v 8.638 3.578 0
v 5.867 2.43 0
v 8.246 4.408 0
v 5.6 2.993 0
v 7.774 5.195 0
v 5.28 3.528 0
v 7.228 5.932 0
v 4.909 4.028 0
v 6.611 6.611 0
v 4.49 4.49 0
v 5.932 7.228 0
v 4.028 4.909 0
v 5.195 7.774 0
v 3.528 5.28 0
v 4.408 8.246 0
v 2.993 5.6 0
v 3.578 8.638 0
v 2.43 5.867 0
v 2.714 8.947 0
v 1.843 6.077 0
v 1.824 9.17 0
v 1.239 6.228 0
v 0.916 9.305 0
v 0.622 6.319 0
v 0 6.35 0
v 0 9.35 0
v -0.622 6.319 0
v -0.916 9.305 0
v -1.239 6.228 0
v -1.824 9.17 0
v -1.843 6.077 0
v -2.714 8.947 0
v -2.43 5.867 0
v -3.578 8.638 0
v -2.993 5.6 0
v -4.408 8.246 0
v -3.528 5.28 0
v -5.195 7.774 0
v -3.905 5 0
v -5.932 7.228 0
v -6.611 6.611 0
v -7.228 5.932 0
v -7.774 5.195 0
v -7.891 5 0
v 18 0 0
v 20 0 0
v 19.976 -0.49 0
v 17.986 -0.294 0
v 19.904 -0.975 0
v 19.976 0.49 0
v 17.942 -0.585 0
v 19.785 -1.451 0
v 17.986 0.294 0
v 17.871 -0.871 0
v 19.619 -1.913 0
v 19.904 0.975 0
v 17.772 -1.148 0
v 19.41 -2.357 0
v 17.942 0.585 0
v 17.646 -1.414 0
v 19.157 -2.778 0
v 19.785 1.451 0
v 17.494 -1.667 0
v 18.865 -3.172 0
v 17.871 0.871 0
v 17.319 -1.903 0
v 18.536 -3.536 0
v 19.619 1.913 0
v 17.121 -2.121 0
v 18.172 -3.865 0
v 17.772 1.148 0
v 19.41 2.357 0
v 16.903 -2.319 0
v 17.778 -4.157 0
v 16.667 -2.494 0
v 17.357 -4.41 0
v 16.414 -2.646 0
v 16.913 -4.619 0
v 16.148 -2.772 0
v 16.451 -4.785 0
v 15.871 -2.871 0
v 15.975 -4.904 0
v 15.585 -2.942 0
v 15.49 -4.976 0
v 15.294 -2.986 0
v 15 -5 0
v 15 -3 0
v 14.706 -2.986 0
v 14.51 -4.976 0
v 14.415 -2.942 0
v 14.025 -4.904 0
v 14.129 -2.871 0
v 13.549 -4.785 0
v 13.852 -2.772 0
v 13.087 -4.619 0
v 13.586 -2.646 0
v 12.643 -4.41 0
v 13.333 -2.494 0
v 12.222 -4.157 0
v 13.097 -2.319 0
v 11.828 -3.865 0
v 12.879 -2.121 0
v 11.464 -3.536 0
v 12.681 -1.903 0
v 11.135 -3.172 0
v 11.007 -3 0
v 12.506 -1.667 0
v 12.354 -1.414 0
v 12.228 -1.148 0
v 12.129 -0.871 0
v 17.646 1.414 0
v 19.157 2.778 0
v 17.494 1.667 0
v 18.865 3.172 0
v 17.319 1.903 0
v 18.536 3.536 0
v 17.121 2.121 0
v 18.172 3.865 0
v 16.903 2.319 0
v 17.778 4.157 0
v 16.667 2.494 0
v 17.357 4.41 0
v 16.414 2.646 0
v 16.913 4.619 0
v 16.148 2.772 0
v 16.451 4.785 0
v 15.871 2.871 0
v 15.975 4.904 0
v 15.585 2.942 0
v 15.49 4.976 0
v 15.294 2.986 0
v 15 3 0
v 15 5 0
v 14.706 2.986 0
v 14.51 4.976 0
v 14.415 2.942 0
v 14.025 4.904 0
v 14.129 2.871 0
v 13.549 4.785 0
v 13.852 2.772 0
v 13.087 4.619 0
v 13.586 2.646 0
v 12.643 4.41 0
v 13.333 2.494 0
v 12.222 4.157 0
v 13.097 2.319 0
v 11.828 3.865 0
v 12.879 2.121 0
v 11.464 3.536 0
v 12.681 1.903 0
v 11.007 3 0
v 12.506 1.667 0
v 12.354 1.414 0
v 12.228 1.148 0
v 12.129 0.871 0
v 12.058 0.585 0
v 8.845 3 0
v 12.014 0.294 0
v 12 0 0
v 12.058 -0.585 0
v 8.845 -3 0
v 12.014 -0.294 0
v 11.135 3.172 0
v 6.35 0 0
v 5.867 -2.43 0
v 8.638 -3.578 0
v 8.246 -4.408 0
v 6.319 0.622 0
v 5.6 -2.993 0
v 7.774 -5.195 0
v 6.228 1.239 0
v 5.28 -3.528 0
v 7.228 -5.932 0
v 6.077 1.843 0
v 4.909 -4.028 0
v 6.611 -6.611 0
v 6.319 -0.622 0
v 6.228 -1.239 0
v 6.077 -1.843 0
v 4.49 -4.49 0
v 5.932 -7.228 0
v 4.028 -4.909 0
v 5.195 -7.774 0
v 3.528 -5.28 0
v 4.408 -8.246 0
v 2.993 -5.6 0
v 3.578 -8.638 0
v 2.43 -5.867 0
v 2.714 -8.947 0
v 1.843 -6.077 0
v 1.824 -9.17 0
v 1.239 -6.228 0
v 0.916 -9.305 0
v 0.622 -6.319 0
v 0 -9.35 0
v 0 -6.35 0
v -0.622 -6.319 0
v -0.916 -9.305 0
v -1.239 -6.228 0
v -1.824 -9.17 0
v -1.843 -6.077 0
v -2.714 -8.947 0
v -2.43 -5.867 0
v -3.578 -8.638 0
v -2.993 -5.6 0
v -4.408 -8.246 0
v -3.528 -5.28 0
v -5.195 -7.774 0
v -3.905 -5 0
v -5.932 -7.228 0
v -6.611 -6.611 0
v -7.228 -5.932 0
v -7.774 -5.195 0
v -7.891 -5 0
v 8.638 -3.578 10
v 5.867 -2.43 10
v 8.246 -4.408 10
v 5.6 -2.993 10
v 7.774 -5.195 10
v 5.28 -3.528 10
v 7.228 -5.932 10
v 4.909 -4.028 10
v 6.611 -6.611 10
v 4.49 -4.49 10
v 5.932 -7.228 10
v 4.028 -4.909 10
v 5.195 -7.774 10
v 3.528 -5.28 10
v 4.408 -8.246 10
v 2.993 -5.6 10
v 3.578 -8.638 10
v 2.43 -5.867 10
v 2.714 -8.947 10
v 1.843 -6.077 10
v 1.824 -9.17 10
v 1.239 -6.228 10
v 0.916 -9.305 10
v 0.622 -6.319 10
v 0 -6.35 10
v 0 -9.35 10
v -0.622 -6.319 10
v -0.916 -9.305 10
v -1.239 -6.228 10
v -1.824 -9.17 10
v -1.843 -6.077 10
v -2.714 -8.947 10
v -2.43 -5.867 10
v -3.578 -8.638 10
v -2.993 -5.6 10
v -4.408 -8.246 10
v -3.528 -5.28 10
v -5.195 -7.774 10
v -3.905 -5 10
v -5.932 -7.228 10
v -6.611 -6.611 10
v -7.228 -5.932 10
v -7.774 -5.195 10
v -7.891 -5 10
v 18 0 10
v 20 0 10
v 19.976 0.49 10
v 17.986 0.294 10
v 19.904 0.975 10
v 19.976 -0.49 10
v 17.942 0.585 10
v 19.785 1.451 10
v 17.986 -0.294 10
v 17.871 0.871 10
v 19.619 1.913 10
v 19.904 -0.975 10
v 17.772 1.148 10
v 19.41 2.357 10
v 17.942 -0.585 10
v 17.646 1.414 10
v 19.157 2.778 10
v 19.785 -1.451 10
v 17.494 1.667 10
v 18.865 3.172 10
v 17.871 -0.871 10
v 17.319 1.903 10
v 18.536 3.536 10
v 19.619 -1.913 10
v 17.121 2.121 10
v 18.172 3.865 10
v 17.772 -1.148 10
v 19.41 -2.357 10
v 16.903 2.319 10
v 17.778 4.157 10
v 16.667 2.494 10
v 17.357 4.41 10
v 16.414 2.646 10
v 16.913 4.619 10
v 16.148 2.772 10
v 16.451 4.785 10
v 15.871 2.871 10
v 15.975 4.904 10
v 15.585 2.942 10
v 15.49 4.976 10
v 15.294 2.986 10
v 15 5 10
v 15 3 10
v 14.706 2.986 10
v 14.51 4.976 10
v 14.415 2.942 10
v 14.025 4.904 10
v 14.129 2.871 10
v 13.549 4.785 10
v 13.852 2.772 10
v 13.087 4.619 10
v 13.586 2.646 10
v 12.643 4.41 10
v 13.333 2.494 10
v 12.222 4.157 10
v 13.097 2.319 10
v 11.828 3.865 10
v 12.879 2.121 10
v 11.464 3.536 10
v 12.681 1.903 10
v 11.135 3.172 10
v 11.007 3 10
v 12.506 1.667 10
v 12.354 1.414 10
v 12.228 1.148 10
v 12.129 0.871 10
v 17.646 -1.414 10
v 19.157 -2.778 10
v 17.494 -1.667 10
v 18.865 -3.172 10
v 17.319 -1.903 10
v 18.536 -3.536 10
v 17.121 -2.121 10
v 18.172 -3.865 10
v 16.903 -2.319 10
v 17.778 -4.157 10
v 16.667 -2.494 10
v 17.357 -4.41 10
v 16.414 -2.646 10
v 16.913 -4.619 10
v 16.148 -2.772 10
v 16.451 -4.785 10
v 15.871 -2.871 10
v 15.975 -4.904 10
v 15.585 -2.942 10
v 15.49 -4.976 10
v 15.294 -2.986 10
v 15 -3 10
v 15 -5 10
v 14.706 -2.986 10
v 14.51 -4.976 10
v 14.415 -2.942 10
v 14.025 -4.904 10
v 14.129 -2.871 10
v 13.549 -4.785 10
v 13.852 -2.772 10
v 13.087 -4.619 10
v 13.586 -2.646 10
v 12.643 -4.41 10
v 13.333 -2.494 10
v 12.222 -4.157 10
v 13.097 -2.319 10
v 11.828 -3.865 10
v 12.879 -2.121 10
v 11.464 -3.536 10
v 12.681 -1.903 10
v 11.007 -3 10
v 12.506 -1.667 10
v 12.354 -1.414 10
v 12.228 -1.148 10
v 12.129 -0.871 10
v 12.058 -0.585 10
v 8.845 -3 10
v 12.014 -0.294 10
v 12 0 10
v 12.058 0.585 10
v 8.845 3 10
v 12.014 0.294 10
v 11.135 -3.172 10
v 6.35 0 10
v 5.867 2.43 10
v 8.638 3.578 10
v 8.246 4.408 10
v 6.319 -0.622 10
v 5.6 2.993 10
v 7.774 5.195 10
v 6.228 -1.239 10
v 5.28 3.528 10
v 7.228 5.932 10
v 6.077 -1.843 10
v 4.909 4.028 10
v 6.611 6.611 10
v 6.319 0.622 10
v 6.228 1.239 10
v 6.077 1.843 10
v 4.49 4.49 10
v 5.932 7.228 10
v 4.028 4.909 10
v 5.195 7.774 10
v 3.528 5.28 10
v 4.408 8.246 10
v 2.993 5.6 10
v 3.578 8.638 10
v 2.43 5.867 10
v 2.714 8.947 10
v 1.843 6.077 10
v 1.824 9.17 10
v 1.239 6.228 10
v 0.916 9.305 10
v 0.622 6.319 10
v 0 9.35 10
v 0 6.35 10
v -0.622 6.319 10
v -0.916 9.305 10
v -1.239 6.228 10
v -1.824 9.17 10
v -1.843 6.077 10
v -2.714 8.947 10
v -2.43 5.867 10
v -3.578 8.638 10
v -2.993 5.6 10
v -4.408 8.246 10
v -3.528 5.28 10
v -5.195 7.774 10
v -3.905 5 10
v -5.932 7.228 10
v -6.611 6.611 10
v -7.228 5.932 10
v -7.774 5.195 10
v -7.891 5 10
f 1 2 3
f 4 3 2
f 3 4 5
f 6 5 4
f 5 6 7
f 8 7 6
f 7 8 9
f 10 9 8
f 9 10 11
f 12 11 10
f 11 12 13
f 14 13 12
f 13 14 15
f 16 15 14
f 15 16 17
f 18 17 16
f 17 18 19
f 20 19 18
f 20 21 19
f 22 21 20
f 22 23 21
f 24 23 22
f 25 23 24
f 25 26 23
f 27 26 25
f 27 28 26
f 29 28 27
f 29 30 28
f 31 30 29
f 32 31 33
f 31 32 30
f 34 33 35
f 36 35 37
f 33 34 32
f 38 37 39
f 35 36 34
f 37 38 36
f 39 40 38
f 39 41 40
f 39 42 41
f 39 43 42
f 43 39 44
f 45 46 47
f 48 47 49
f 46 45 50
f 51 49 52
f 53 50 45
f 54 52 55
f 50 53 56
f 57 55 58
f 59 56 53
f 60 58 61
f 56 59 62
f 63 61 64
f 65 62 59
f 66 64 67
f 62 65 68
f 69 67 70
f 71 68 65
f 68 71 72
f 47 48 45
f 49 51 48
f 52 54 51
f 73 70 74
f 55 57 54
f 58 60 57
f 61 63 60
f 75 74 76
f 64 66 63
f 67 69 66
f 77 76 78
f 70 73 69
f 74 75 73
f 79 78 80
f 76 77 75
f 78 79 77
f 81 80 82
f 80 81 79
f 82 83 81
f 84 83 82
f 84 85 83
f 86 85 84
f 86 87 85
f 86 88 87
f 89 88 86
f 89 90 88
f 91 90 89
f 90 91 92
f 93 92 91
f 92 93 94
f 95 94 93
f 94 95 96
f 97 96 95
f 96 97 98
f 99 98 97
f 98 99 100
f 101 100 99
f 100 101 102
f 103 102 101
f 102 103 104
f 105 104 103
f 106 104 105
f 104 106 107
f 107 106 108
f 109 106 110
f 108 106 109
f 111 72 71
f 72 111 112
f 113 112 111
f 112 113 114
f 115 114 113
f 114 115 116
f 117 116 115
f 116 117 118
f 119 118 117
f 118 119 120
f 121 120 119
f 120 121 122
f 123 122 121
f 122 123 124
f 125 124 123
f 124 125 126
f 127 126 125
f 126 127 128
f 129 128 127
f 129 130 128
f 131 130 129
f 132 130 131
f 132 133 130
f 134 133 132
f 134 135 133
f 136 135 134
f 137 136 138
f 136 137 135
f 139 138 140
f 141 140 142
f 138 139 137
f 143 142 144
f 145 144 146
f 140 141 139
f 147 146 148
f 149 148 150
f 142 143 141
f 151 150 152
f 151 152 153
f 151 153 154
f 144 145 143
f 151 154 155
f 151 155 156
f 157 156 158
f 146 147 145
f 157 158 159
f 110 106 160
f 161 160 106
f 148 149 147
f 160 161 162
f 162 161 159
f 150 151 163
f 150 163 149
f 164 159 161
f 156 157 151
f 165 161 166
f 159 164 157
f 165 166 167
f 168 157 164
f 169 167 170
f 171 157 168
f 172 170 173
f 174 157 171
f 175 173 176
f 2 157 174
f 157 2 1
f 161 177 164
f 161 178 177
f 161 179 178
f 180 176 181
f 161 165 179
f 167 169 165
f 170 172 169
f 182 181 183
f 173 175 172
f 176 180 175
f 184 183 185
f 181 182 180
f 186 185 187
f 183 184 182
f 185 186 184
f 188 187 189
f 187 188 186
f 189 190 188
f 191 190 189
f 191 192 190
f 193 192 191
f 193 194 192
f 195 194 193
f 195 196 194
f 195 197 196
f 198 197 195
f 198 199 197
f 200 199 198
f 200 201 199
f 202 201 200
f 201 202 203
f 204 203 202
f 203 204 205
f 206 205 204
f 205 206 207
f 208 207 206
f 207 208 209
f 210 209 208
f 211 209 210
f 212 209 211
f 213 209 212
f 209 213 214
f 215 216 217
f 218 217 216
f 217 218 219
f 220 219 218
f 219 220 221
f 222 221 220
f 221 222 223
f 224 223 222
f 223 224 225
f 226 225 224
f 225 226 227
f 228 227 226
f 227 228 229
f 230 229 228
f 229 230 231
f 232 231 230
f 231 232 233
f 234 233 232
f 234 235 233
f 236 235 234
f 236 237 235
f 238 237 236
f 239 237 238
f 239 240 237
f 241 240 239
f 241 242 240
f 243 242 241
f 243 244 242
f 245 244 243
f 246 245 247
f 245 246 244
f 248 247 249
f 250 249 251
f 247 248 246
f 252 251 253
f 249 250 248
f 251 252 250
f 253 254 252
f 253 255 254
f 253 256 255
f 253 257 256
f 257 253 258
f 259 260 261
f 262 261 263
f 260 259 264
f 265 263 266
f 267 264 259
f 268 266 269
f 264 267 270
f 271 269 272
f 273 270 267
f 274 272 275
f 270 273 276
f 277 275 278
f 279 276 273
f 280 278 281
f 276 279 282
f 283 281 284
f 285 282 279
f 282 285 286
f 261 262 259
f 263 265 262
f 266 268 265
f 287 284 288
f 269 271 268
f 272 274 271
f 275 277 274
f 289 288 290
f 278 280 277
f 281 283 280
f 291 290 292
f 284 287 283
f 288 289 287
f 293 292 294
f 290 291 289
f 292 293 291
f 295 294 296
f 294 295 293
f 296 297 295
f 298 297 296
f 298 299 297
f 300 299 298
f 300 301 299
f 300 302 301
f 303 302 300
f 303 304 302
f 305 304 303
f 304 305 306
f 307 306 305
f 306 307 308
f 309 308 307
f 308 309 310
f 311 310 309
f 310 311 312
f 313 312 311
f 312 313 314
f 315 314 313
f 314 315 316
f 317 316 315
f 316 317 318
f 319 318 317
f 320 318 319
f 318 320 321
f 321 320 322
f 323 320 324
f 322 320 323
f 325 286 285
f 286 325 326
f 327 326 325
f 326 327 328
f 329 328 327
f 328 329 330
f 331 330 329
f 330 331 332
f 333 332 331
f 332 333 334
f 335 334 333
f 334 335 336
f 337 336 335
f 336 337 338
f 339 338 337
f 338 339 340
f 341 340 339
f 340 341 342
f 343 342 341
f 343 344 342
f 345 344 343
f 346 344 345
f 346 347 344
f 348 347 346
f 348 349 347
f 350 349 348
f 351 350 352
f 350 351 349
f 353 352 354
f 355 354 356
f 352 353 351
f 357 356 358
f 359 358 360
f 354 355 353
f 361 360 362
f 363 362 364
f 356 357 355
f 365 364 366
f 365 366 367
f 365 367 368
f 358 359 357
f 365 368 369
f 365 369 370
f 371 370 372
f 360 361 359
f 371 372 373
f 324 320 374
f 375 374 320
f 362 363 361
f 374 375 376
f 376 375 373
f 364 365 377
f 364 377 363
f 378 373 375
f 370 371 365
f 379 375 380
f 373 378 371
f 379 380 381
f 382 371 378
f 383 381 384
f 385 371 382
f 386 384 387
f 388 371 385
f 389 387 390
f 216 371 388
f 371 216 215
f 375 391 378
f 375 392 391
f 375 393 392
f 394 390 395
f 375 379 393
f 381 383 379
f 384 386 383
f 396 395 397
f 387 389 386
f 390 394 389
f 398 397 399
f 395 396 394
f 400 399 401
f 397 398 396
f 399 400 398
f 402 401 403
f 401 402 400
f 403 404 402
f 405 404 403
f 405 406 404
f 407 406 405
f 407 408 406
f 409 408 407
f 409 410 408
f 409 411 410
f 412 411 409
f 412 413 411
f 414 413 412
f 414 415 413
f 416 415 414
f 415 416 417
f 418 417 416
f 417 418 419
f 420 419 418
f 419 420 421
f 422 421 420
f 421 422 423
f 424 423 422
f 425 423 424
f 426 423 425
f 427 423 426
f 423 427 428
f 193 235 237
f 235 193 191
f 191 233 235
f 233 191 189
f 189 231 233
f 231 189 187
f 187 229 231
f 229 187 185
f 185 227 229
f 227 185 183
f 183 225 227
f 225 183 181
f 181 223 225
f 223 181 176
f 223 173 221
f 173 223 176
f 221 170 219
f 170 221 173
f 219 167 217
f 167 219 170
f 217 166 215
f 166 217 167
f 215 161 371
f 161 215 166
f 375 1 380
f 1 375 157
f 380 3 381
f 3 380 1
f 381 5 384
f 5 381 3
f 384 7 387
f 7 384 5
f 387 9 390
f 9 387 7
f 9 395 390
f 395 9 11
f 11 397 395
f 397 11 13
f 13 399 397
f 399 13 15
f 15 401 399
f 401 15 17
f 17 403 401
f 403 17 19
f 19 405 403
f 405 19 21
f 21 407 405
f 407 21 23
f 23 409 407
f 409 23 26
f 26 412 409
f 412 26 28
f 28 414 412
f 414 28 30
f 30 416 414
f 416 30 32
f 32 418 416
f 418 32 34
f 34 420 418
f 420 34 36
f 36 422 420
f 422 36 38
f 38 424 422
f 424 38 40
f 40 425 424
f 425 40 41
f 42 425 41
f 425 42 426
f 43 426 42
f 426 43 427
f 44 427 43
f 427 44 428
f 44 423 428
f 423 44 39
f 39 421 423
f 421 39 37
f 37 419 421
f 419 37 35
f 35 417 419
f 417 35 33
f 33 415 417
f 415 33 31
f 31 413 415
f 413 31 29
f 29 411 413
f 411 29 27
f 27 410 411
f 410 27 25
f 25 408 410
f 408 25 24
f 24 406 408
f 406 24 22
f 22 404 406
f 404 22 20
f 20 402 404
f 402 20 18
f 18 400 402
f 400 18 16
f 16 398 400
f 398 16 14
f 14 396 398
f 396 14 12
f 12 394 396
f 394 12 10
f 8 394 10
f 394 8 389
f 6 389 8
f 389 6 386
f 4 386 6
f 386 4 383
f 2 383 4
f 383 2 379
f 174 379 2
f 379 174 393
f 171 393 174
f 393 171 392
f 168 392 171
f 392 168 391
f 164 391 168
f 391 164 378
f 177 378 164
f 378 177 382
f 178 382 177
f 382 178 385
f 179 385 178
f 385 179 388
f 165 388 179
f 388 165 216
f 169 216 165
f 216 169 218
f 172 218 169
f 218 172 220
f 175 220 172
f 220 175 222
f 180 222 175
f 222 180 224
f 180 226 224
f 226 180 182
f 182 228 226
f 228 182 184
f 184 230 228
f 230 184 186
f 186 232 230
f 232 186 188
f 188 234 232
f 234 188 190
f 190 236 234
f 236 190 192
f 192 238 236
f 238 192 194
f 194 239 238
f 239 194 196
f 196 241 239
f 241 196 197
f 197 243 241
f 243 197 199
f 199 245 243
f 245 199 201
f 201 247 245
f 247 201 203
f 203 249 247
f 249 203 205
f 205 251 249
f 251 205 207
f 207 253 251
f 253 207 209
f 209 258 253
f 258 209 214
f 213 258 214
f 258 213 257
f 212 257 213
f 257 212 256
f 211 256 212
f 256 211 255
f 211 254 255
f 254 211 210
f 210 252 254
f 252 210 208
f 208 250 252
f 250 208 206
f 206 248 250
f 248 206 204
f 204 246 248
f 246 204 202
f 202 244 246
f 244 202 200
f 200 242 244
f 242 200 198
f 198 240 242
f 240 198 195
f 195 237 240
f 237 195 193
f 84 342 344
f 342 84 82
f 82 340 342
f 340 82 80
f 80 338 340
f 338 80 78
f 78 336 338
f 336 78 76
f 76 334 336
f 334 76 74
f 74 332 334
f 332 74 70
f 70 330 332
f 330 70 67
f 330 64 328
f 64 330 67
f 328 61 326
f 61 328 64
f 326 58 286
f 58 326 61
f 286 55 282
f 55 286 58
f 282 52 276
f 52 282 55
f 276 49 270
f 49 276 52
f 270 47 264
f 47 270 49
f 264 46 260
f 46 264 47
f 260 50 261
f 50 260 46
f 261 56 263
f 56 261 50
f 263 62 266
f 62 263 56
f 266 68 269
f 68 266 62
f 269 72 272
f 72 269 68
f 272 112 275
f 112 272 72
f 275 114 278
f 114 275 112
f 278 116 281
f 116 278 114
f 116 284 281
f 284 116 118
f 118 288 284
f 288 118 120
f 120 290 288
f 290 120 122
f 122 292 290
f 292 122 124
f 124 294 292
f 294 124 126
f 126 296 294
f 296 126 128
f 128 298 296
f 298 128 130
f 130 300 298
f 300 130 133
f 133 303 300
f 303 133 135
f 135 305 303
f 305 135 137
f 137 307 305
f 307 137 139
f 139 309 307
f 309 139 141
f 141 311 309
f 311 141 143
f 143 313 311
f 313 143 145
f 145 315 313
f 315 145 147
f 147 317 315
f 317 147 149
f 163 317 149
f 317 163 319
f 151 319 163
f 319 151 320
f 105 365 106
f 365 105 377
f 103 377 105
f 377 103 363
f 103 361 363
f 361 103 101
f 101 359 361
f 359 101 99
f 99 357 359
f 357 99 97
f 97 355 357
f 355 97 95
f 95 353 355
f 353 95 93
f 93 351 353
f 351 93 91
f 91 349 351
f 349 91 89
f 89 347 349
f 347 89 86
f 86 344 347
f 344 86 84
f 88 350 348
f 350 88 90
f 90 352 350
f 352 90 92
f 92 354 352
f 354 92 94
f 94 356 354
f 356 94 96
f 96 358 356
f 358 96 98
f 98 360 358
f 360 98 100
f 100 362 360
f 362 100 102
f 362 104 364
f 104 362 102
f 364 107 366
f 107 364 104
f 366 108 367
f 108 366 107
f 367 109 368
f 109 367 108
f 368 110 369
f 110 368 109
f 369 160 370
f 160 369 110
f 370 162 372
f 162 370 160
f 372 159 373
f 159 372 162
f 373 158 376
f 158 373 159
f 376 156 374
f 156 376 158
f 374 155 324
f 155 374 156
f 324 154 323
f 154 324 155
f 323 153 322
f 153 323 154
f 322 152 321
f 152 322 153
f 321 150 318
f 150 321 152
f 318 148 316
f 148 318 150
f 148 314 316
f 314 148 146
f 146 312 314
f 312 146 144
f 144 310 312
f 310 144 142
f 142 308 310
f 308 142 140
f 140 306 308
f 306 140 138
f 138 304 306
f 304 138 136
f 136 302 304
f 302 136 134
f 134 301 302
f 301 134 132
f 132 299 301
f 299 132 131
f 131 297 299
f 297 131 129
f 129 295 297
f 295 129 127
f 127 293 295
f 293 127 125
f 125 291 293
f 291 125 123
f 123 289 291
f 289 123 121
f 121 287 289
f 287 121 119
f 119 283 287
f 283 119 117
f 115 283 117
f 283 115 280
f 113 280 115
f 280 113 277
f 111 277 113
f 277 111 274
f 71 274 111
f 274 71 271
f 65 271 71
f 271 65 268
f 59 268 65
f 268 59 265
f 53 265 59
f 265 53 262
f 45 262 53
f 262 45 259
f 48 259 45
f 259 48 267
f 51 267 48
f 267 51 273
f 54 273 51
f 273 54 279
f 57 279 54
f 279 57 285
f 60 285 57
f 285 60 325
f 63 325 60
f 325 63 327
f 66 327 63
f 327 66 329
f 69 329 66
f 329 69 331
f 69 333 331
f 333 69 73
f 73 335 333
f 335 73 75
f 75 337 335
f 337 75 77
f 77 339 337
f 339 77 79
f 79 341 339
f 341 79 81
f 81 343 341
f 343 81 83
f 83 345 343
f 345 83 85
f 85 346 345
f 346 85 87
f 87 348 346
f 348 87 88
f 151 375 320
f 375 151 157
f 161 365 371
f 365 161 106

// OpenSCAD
// Snap-on clip for 12.7mm rod and 6mm tubing
// Designed for FDM printing: printed flat on the XY plane.

// --- Dimensions ---
rod_id      = 12.7;    // Inner diameter of the rod ring
rod_wall    = 3.0;     // Wall thickness of the rod ring
rod_od      = rod_id + 2 * rod_wall; // Outer diameter of the rod ring

rod_gap_w   = 10.0;    // Width of the opening in the rod ring
rod_gap_h   = 10.0;    // Height of the opening in the rod ring (covers Y range)

tube_id     = 6.0;     // Inner diameter of the tubing ring
tube_wall   = 2.0;     // Wall thickness of the tubing ring
tube_od     = tube_id + 2 * tube_wall; // Outer diameter of the tubing ring

tube_gap_w  = 4.5;     // Width of the opening in the tubing ring
tube_gap_h  = 4.5;     // Height of the opening in the tubing ring

bridge_w_y  = 6.0;     // Width of the bridge along the Y axis
bridge_x_min = 8.0;    // Start of the bridge on X axis
bridge_x_max = 12.0;   // End of the bridge on X axis

clip_height = 10.0;    // Extrusion height (Z)
tube_offset_x = 15.0;  // X-coordinate of the tubing ring center

$fn = 64;

// --- Geometry Construction ---

// 1. The Rod Ring Profile (2D)
module rod_ring_profile() {
    difference() {
        circle(d = rod_od);
        circle(d = rod_id);
        // Cutout on the -X side: x < 0 and -5 < y < 5
        // We use a large rectangle to ensure a clean cut
        translate([-rod_od, -rod_gap_h/2]) 
            square([rod_od, rod_gap_h]);
    }
}

// 2. The Tubing Ring Profile (2D)
module tube_ring_profile() {
    difference() {
        circle(d = tube_od);
        circle(d = tube_id);
        // Cutout on the +X side: x > 15 and -2.25 < y < 2.25
        // Since the circle is centered at (15,0), we translate the cutout
        translate([tube_offset_x - tube_od/2, -tube_gap_h/2])
            square([tube_od, tube_gap_h]);
    }
}

// 3. The Bridge Profile (2D)
module bridge_profile() {
    // A rectangle centered on Y, spanning from bridge_x_min to bridge_x_max
    // We use a small offset to ensure it doesn't overlap the ring interiors
    translate([bridge_x_min, -bridge_w_y/2])
        square([bridge_x_max - bridge_x_min, bridge_w_y]);
}

// --- Final Assembly ---

union() {
    // The Rod Ring
    linear_extrude(height = clip_height) 
        rod_ring_profile();
    
    // The Tubing Ring
    translate([tube_offset_x, 0])
        linear_extrude(height = clip_height) 
            tube_ring_profile();
            
    // The Bridge
    translate([0, 0])
        linear_extrude(height = clip_height) 
            bridge_profile();
}

// Note: The bridge is defined as a solid block between x=8 and x=12.
// Because the rod ring ends at x = -9.35 and the tubing ring starts at x = 13,
// the bridge connects the two bodies.
